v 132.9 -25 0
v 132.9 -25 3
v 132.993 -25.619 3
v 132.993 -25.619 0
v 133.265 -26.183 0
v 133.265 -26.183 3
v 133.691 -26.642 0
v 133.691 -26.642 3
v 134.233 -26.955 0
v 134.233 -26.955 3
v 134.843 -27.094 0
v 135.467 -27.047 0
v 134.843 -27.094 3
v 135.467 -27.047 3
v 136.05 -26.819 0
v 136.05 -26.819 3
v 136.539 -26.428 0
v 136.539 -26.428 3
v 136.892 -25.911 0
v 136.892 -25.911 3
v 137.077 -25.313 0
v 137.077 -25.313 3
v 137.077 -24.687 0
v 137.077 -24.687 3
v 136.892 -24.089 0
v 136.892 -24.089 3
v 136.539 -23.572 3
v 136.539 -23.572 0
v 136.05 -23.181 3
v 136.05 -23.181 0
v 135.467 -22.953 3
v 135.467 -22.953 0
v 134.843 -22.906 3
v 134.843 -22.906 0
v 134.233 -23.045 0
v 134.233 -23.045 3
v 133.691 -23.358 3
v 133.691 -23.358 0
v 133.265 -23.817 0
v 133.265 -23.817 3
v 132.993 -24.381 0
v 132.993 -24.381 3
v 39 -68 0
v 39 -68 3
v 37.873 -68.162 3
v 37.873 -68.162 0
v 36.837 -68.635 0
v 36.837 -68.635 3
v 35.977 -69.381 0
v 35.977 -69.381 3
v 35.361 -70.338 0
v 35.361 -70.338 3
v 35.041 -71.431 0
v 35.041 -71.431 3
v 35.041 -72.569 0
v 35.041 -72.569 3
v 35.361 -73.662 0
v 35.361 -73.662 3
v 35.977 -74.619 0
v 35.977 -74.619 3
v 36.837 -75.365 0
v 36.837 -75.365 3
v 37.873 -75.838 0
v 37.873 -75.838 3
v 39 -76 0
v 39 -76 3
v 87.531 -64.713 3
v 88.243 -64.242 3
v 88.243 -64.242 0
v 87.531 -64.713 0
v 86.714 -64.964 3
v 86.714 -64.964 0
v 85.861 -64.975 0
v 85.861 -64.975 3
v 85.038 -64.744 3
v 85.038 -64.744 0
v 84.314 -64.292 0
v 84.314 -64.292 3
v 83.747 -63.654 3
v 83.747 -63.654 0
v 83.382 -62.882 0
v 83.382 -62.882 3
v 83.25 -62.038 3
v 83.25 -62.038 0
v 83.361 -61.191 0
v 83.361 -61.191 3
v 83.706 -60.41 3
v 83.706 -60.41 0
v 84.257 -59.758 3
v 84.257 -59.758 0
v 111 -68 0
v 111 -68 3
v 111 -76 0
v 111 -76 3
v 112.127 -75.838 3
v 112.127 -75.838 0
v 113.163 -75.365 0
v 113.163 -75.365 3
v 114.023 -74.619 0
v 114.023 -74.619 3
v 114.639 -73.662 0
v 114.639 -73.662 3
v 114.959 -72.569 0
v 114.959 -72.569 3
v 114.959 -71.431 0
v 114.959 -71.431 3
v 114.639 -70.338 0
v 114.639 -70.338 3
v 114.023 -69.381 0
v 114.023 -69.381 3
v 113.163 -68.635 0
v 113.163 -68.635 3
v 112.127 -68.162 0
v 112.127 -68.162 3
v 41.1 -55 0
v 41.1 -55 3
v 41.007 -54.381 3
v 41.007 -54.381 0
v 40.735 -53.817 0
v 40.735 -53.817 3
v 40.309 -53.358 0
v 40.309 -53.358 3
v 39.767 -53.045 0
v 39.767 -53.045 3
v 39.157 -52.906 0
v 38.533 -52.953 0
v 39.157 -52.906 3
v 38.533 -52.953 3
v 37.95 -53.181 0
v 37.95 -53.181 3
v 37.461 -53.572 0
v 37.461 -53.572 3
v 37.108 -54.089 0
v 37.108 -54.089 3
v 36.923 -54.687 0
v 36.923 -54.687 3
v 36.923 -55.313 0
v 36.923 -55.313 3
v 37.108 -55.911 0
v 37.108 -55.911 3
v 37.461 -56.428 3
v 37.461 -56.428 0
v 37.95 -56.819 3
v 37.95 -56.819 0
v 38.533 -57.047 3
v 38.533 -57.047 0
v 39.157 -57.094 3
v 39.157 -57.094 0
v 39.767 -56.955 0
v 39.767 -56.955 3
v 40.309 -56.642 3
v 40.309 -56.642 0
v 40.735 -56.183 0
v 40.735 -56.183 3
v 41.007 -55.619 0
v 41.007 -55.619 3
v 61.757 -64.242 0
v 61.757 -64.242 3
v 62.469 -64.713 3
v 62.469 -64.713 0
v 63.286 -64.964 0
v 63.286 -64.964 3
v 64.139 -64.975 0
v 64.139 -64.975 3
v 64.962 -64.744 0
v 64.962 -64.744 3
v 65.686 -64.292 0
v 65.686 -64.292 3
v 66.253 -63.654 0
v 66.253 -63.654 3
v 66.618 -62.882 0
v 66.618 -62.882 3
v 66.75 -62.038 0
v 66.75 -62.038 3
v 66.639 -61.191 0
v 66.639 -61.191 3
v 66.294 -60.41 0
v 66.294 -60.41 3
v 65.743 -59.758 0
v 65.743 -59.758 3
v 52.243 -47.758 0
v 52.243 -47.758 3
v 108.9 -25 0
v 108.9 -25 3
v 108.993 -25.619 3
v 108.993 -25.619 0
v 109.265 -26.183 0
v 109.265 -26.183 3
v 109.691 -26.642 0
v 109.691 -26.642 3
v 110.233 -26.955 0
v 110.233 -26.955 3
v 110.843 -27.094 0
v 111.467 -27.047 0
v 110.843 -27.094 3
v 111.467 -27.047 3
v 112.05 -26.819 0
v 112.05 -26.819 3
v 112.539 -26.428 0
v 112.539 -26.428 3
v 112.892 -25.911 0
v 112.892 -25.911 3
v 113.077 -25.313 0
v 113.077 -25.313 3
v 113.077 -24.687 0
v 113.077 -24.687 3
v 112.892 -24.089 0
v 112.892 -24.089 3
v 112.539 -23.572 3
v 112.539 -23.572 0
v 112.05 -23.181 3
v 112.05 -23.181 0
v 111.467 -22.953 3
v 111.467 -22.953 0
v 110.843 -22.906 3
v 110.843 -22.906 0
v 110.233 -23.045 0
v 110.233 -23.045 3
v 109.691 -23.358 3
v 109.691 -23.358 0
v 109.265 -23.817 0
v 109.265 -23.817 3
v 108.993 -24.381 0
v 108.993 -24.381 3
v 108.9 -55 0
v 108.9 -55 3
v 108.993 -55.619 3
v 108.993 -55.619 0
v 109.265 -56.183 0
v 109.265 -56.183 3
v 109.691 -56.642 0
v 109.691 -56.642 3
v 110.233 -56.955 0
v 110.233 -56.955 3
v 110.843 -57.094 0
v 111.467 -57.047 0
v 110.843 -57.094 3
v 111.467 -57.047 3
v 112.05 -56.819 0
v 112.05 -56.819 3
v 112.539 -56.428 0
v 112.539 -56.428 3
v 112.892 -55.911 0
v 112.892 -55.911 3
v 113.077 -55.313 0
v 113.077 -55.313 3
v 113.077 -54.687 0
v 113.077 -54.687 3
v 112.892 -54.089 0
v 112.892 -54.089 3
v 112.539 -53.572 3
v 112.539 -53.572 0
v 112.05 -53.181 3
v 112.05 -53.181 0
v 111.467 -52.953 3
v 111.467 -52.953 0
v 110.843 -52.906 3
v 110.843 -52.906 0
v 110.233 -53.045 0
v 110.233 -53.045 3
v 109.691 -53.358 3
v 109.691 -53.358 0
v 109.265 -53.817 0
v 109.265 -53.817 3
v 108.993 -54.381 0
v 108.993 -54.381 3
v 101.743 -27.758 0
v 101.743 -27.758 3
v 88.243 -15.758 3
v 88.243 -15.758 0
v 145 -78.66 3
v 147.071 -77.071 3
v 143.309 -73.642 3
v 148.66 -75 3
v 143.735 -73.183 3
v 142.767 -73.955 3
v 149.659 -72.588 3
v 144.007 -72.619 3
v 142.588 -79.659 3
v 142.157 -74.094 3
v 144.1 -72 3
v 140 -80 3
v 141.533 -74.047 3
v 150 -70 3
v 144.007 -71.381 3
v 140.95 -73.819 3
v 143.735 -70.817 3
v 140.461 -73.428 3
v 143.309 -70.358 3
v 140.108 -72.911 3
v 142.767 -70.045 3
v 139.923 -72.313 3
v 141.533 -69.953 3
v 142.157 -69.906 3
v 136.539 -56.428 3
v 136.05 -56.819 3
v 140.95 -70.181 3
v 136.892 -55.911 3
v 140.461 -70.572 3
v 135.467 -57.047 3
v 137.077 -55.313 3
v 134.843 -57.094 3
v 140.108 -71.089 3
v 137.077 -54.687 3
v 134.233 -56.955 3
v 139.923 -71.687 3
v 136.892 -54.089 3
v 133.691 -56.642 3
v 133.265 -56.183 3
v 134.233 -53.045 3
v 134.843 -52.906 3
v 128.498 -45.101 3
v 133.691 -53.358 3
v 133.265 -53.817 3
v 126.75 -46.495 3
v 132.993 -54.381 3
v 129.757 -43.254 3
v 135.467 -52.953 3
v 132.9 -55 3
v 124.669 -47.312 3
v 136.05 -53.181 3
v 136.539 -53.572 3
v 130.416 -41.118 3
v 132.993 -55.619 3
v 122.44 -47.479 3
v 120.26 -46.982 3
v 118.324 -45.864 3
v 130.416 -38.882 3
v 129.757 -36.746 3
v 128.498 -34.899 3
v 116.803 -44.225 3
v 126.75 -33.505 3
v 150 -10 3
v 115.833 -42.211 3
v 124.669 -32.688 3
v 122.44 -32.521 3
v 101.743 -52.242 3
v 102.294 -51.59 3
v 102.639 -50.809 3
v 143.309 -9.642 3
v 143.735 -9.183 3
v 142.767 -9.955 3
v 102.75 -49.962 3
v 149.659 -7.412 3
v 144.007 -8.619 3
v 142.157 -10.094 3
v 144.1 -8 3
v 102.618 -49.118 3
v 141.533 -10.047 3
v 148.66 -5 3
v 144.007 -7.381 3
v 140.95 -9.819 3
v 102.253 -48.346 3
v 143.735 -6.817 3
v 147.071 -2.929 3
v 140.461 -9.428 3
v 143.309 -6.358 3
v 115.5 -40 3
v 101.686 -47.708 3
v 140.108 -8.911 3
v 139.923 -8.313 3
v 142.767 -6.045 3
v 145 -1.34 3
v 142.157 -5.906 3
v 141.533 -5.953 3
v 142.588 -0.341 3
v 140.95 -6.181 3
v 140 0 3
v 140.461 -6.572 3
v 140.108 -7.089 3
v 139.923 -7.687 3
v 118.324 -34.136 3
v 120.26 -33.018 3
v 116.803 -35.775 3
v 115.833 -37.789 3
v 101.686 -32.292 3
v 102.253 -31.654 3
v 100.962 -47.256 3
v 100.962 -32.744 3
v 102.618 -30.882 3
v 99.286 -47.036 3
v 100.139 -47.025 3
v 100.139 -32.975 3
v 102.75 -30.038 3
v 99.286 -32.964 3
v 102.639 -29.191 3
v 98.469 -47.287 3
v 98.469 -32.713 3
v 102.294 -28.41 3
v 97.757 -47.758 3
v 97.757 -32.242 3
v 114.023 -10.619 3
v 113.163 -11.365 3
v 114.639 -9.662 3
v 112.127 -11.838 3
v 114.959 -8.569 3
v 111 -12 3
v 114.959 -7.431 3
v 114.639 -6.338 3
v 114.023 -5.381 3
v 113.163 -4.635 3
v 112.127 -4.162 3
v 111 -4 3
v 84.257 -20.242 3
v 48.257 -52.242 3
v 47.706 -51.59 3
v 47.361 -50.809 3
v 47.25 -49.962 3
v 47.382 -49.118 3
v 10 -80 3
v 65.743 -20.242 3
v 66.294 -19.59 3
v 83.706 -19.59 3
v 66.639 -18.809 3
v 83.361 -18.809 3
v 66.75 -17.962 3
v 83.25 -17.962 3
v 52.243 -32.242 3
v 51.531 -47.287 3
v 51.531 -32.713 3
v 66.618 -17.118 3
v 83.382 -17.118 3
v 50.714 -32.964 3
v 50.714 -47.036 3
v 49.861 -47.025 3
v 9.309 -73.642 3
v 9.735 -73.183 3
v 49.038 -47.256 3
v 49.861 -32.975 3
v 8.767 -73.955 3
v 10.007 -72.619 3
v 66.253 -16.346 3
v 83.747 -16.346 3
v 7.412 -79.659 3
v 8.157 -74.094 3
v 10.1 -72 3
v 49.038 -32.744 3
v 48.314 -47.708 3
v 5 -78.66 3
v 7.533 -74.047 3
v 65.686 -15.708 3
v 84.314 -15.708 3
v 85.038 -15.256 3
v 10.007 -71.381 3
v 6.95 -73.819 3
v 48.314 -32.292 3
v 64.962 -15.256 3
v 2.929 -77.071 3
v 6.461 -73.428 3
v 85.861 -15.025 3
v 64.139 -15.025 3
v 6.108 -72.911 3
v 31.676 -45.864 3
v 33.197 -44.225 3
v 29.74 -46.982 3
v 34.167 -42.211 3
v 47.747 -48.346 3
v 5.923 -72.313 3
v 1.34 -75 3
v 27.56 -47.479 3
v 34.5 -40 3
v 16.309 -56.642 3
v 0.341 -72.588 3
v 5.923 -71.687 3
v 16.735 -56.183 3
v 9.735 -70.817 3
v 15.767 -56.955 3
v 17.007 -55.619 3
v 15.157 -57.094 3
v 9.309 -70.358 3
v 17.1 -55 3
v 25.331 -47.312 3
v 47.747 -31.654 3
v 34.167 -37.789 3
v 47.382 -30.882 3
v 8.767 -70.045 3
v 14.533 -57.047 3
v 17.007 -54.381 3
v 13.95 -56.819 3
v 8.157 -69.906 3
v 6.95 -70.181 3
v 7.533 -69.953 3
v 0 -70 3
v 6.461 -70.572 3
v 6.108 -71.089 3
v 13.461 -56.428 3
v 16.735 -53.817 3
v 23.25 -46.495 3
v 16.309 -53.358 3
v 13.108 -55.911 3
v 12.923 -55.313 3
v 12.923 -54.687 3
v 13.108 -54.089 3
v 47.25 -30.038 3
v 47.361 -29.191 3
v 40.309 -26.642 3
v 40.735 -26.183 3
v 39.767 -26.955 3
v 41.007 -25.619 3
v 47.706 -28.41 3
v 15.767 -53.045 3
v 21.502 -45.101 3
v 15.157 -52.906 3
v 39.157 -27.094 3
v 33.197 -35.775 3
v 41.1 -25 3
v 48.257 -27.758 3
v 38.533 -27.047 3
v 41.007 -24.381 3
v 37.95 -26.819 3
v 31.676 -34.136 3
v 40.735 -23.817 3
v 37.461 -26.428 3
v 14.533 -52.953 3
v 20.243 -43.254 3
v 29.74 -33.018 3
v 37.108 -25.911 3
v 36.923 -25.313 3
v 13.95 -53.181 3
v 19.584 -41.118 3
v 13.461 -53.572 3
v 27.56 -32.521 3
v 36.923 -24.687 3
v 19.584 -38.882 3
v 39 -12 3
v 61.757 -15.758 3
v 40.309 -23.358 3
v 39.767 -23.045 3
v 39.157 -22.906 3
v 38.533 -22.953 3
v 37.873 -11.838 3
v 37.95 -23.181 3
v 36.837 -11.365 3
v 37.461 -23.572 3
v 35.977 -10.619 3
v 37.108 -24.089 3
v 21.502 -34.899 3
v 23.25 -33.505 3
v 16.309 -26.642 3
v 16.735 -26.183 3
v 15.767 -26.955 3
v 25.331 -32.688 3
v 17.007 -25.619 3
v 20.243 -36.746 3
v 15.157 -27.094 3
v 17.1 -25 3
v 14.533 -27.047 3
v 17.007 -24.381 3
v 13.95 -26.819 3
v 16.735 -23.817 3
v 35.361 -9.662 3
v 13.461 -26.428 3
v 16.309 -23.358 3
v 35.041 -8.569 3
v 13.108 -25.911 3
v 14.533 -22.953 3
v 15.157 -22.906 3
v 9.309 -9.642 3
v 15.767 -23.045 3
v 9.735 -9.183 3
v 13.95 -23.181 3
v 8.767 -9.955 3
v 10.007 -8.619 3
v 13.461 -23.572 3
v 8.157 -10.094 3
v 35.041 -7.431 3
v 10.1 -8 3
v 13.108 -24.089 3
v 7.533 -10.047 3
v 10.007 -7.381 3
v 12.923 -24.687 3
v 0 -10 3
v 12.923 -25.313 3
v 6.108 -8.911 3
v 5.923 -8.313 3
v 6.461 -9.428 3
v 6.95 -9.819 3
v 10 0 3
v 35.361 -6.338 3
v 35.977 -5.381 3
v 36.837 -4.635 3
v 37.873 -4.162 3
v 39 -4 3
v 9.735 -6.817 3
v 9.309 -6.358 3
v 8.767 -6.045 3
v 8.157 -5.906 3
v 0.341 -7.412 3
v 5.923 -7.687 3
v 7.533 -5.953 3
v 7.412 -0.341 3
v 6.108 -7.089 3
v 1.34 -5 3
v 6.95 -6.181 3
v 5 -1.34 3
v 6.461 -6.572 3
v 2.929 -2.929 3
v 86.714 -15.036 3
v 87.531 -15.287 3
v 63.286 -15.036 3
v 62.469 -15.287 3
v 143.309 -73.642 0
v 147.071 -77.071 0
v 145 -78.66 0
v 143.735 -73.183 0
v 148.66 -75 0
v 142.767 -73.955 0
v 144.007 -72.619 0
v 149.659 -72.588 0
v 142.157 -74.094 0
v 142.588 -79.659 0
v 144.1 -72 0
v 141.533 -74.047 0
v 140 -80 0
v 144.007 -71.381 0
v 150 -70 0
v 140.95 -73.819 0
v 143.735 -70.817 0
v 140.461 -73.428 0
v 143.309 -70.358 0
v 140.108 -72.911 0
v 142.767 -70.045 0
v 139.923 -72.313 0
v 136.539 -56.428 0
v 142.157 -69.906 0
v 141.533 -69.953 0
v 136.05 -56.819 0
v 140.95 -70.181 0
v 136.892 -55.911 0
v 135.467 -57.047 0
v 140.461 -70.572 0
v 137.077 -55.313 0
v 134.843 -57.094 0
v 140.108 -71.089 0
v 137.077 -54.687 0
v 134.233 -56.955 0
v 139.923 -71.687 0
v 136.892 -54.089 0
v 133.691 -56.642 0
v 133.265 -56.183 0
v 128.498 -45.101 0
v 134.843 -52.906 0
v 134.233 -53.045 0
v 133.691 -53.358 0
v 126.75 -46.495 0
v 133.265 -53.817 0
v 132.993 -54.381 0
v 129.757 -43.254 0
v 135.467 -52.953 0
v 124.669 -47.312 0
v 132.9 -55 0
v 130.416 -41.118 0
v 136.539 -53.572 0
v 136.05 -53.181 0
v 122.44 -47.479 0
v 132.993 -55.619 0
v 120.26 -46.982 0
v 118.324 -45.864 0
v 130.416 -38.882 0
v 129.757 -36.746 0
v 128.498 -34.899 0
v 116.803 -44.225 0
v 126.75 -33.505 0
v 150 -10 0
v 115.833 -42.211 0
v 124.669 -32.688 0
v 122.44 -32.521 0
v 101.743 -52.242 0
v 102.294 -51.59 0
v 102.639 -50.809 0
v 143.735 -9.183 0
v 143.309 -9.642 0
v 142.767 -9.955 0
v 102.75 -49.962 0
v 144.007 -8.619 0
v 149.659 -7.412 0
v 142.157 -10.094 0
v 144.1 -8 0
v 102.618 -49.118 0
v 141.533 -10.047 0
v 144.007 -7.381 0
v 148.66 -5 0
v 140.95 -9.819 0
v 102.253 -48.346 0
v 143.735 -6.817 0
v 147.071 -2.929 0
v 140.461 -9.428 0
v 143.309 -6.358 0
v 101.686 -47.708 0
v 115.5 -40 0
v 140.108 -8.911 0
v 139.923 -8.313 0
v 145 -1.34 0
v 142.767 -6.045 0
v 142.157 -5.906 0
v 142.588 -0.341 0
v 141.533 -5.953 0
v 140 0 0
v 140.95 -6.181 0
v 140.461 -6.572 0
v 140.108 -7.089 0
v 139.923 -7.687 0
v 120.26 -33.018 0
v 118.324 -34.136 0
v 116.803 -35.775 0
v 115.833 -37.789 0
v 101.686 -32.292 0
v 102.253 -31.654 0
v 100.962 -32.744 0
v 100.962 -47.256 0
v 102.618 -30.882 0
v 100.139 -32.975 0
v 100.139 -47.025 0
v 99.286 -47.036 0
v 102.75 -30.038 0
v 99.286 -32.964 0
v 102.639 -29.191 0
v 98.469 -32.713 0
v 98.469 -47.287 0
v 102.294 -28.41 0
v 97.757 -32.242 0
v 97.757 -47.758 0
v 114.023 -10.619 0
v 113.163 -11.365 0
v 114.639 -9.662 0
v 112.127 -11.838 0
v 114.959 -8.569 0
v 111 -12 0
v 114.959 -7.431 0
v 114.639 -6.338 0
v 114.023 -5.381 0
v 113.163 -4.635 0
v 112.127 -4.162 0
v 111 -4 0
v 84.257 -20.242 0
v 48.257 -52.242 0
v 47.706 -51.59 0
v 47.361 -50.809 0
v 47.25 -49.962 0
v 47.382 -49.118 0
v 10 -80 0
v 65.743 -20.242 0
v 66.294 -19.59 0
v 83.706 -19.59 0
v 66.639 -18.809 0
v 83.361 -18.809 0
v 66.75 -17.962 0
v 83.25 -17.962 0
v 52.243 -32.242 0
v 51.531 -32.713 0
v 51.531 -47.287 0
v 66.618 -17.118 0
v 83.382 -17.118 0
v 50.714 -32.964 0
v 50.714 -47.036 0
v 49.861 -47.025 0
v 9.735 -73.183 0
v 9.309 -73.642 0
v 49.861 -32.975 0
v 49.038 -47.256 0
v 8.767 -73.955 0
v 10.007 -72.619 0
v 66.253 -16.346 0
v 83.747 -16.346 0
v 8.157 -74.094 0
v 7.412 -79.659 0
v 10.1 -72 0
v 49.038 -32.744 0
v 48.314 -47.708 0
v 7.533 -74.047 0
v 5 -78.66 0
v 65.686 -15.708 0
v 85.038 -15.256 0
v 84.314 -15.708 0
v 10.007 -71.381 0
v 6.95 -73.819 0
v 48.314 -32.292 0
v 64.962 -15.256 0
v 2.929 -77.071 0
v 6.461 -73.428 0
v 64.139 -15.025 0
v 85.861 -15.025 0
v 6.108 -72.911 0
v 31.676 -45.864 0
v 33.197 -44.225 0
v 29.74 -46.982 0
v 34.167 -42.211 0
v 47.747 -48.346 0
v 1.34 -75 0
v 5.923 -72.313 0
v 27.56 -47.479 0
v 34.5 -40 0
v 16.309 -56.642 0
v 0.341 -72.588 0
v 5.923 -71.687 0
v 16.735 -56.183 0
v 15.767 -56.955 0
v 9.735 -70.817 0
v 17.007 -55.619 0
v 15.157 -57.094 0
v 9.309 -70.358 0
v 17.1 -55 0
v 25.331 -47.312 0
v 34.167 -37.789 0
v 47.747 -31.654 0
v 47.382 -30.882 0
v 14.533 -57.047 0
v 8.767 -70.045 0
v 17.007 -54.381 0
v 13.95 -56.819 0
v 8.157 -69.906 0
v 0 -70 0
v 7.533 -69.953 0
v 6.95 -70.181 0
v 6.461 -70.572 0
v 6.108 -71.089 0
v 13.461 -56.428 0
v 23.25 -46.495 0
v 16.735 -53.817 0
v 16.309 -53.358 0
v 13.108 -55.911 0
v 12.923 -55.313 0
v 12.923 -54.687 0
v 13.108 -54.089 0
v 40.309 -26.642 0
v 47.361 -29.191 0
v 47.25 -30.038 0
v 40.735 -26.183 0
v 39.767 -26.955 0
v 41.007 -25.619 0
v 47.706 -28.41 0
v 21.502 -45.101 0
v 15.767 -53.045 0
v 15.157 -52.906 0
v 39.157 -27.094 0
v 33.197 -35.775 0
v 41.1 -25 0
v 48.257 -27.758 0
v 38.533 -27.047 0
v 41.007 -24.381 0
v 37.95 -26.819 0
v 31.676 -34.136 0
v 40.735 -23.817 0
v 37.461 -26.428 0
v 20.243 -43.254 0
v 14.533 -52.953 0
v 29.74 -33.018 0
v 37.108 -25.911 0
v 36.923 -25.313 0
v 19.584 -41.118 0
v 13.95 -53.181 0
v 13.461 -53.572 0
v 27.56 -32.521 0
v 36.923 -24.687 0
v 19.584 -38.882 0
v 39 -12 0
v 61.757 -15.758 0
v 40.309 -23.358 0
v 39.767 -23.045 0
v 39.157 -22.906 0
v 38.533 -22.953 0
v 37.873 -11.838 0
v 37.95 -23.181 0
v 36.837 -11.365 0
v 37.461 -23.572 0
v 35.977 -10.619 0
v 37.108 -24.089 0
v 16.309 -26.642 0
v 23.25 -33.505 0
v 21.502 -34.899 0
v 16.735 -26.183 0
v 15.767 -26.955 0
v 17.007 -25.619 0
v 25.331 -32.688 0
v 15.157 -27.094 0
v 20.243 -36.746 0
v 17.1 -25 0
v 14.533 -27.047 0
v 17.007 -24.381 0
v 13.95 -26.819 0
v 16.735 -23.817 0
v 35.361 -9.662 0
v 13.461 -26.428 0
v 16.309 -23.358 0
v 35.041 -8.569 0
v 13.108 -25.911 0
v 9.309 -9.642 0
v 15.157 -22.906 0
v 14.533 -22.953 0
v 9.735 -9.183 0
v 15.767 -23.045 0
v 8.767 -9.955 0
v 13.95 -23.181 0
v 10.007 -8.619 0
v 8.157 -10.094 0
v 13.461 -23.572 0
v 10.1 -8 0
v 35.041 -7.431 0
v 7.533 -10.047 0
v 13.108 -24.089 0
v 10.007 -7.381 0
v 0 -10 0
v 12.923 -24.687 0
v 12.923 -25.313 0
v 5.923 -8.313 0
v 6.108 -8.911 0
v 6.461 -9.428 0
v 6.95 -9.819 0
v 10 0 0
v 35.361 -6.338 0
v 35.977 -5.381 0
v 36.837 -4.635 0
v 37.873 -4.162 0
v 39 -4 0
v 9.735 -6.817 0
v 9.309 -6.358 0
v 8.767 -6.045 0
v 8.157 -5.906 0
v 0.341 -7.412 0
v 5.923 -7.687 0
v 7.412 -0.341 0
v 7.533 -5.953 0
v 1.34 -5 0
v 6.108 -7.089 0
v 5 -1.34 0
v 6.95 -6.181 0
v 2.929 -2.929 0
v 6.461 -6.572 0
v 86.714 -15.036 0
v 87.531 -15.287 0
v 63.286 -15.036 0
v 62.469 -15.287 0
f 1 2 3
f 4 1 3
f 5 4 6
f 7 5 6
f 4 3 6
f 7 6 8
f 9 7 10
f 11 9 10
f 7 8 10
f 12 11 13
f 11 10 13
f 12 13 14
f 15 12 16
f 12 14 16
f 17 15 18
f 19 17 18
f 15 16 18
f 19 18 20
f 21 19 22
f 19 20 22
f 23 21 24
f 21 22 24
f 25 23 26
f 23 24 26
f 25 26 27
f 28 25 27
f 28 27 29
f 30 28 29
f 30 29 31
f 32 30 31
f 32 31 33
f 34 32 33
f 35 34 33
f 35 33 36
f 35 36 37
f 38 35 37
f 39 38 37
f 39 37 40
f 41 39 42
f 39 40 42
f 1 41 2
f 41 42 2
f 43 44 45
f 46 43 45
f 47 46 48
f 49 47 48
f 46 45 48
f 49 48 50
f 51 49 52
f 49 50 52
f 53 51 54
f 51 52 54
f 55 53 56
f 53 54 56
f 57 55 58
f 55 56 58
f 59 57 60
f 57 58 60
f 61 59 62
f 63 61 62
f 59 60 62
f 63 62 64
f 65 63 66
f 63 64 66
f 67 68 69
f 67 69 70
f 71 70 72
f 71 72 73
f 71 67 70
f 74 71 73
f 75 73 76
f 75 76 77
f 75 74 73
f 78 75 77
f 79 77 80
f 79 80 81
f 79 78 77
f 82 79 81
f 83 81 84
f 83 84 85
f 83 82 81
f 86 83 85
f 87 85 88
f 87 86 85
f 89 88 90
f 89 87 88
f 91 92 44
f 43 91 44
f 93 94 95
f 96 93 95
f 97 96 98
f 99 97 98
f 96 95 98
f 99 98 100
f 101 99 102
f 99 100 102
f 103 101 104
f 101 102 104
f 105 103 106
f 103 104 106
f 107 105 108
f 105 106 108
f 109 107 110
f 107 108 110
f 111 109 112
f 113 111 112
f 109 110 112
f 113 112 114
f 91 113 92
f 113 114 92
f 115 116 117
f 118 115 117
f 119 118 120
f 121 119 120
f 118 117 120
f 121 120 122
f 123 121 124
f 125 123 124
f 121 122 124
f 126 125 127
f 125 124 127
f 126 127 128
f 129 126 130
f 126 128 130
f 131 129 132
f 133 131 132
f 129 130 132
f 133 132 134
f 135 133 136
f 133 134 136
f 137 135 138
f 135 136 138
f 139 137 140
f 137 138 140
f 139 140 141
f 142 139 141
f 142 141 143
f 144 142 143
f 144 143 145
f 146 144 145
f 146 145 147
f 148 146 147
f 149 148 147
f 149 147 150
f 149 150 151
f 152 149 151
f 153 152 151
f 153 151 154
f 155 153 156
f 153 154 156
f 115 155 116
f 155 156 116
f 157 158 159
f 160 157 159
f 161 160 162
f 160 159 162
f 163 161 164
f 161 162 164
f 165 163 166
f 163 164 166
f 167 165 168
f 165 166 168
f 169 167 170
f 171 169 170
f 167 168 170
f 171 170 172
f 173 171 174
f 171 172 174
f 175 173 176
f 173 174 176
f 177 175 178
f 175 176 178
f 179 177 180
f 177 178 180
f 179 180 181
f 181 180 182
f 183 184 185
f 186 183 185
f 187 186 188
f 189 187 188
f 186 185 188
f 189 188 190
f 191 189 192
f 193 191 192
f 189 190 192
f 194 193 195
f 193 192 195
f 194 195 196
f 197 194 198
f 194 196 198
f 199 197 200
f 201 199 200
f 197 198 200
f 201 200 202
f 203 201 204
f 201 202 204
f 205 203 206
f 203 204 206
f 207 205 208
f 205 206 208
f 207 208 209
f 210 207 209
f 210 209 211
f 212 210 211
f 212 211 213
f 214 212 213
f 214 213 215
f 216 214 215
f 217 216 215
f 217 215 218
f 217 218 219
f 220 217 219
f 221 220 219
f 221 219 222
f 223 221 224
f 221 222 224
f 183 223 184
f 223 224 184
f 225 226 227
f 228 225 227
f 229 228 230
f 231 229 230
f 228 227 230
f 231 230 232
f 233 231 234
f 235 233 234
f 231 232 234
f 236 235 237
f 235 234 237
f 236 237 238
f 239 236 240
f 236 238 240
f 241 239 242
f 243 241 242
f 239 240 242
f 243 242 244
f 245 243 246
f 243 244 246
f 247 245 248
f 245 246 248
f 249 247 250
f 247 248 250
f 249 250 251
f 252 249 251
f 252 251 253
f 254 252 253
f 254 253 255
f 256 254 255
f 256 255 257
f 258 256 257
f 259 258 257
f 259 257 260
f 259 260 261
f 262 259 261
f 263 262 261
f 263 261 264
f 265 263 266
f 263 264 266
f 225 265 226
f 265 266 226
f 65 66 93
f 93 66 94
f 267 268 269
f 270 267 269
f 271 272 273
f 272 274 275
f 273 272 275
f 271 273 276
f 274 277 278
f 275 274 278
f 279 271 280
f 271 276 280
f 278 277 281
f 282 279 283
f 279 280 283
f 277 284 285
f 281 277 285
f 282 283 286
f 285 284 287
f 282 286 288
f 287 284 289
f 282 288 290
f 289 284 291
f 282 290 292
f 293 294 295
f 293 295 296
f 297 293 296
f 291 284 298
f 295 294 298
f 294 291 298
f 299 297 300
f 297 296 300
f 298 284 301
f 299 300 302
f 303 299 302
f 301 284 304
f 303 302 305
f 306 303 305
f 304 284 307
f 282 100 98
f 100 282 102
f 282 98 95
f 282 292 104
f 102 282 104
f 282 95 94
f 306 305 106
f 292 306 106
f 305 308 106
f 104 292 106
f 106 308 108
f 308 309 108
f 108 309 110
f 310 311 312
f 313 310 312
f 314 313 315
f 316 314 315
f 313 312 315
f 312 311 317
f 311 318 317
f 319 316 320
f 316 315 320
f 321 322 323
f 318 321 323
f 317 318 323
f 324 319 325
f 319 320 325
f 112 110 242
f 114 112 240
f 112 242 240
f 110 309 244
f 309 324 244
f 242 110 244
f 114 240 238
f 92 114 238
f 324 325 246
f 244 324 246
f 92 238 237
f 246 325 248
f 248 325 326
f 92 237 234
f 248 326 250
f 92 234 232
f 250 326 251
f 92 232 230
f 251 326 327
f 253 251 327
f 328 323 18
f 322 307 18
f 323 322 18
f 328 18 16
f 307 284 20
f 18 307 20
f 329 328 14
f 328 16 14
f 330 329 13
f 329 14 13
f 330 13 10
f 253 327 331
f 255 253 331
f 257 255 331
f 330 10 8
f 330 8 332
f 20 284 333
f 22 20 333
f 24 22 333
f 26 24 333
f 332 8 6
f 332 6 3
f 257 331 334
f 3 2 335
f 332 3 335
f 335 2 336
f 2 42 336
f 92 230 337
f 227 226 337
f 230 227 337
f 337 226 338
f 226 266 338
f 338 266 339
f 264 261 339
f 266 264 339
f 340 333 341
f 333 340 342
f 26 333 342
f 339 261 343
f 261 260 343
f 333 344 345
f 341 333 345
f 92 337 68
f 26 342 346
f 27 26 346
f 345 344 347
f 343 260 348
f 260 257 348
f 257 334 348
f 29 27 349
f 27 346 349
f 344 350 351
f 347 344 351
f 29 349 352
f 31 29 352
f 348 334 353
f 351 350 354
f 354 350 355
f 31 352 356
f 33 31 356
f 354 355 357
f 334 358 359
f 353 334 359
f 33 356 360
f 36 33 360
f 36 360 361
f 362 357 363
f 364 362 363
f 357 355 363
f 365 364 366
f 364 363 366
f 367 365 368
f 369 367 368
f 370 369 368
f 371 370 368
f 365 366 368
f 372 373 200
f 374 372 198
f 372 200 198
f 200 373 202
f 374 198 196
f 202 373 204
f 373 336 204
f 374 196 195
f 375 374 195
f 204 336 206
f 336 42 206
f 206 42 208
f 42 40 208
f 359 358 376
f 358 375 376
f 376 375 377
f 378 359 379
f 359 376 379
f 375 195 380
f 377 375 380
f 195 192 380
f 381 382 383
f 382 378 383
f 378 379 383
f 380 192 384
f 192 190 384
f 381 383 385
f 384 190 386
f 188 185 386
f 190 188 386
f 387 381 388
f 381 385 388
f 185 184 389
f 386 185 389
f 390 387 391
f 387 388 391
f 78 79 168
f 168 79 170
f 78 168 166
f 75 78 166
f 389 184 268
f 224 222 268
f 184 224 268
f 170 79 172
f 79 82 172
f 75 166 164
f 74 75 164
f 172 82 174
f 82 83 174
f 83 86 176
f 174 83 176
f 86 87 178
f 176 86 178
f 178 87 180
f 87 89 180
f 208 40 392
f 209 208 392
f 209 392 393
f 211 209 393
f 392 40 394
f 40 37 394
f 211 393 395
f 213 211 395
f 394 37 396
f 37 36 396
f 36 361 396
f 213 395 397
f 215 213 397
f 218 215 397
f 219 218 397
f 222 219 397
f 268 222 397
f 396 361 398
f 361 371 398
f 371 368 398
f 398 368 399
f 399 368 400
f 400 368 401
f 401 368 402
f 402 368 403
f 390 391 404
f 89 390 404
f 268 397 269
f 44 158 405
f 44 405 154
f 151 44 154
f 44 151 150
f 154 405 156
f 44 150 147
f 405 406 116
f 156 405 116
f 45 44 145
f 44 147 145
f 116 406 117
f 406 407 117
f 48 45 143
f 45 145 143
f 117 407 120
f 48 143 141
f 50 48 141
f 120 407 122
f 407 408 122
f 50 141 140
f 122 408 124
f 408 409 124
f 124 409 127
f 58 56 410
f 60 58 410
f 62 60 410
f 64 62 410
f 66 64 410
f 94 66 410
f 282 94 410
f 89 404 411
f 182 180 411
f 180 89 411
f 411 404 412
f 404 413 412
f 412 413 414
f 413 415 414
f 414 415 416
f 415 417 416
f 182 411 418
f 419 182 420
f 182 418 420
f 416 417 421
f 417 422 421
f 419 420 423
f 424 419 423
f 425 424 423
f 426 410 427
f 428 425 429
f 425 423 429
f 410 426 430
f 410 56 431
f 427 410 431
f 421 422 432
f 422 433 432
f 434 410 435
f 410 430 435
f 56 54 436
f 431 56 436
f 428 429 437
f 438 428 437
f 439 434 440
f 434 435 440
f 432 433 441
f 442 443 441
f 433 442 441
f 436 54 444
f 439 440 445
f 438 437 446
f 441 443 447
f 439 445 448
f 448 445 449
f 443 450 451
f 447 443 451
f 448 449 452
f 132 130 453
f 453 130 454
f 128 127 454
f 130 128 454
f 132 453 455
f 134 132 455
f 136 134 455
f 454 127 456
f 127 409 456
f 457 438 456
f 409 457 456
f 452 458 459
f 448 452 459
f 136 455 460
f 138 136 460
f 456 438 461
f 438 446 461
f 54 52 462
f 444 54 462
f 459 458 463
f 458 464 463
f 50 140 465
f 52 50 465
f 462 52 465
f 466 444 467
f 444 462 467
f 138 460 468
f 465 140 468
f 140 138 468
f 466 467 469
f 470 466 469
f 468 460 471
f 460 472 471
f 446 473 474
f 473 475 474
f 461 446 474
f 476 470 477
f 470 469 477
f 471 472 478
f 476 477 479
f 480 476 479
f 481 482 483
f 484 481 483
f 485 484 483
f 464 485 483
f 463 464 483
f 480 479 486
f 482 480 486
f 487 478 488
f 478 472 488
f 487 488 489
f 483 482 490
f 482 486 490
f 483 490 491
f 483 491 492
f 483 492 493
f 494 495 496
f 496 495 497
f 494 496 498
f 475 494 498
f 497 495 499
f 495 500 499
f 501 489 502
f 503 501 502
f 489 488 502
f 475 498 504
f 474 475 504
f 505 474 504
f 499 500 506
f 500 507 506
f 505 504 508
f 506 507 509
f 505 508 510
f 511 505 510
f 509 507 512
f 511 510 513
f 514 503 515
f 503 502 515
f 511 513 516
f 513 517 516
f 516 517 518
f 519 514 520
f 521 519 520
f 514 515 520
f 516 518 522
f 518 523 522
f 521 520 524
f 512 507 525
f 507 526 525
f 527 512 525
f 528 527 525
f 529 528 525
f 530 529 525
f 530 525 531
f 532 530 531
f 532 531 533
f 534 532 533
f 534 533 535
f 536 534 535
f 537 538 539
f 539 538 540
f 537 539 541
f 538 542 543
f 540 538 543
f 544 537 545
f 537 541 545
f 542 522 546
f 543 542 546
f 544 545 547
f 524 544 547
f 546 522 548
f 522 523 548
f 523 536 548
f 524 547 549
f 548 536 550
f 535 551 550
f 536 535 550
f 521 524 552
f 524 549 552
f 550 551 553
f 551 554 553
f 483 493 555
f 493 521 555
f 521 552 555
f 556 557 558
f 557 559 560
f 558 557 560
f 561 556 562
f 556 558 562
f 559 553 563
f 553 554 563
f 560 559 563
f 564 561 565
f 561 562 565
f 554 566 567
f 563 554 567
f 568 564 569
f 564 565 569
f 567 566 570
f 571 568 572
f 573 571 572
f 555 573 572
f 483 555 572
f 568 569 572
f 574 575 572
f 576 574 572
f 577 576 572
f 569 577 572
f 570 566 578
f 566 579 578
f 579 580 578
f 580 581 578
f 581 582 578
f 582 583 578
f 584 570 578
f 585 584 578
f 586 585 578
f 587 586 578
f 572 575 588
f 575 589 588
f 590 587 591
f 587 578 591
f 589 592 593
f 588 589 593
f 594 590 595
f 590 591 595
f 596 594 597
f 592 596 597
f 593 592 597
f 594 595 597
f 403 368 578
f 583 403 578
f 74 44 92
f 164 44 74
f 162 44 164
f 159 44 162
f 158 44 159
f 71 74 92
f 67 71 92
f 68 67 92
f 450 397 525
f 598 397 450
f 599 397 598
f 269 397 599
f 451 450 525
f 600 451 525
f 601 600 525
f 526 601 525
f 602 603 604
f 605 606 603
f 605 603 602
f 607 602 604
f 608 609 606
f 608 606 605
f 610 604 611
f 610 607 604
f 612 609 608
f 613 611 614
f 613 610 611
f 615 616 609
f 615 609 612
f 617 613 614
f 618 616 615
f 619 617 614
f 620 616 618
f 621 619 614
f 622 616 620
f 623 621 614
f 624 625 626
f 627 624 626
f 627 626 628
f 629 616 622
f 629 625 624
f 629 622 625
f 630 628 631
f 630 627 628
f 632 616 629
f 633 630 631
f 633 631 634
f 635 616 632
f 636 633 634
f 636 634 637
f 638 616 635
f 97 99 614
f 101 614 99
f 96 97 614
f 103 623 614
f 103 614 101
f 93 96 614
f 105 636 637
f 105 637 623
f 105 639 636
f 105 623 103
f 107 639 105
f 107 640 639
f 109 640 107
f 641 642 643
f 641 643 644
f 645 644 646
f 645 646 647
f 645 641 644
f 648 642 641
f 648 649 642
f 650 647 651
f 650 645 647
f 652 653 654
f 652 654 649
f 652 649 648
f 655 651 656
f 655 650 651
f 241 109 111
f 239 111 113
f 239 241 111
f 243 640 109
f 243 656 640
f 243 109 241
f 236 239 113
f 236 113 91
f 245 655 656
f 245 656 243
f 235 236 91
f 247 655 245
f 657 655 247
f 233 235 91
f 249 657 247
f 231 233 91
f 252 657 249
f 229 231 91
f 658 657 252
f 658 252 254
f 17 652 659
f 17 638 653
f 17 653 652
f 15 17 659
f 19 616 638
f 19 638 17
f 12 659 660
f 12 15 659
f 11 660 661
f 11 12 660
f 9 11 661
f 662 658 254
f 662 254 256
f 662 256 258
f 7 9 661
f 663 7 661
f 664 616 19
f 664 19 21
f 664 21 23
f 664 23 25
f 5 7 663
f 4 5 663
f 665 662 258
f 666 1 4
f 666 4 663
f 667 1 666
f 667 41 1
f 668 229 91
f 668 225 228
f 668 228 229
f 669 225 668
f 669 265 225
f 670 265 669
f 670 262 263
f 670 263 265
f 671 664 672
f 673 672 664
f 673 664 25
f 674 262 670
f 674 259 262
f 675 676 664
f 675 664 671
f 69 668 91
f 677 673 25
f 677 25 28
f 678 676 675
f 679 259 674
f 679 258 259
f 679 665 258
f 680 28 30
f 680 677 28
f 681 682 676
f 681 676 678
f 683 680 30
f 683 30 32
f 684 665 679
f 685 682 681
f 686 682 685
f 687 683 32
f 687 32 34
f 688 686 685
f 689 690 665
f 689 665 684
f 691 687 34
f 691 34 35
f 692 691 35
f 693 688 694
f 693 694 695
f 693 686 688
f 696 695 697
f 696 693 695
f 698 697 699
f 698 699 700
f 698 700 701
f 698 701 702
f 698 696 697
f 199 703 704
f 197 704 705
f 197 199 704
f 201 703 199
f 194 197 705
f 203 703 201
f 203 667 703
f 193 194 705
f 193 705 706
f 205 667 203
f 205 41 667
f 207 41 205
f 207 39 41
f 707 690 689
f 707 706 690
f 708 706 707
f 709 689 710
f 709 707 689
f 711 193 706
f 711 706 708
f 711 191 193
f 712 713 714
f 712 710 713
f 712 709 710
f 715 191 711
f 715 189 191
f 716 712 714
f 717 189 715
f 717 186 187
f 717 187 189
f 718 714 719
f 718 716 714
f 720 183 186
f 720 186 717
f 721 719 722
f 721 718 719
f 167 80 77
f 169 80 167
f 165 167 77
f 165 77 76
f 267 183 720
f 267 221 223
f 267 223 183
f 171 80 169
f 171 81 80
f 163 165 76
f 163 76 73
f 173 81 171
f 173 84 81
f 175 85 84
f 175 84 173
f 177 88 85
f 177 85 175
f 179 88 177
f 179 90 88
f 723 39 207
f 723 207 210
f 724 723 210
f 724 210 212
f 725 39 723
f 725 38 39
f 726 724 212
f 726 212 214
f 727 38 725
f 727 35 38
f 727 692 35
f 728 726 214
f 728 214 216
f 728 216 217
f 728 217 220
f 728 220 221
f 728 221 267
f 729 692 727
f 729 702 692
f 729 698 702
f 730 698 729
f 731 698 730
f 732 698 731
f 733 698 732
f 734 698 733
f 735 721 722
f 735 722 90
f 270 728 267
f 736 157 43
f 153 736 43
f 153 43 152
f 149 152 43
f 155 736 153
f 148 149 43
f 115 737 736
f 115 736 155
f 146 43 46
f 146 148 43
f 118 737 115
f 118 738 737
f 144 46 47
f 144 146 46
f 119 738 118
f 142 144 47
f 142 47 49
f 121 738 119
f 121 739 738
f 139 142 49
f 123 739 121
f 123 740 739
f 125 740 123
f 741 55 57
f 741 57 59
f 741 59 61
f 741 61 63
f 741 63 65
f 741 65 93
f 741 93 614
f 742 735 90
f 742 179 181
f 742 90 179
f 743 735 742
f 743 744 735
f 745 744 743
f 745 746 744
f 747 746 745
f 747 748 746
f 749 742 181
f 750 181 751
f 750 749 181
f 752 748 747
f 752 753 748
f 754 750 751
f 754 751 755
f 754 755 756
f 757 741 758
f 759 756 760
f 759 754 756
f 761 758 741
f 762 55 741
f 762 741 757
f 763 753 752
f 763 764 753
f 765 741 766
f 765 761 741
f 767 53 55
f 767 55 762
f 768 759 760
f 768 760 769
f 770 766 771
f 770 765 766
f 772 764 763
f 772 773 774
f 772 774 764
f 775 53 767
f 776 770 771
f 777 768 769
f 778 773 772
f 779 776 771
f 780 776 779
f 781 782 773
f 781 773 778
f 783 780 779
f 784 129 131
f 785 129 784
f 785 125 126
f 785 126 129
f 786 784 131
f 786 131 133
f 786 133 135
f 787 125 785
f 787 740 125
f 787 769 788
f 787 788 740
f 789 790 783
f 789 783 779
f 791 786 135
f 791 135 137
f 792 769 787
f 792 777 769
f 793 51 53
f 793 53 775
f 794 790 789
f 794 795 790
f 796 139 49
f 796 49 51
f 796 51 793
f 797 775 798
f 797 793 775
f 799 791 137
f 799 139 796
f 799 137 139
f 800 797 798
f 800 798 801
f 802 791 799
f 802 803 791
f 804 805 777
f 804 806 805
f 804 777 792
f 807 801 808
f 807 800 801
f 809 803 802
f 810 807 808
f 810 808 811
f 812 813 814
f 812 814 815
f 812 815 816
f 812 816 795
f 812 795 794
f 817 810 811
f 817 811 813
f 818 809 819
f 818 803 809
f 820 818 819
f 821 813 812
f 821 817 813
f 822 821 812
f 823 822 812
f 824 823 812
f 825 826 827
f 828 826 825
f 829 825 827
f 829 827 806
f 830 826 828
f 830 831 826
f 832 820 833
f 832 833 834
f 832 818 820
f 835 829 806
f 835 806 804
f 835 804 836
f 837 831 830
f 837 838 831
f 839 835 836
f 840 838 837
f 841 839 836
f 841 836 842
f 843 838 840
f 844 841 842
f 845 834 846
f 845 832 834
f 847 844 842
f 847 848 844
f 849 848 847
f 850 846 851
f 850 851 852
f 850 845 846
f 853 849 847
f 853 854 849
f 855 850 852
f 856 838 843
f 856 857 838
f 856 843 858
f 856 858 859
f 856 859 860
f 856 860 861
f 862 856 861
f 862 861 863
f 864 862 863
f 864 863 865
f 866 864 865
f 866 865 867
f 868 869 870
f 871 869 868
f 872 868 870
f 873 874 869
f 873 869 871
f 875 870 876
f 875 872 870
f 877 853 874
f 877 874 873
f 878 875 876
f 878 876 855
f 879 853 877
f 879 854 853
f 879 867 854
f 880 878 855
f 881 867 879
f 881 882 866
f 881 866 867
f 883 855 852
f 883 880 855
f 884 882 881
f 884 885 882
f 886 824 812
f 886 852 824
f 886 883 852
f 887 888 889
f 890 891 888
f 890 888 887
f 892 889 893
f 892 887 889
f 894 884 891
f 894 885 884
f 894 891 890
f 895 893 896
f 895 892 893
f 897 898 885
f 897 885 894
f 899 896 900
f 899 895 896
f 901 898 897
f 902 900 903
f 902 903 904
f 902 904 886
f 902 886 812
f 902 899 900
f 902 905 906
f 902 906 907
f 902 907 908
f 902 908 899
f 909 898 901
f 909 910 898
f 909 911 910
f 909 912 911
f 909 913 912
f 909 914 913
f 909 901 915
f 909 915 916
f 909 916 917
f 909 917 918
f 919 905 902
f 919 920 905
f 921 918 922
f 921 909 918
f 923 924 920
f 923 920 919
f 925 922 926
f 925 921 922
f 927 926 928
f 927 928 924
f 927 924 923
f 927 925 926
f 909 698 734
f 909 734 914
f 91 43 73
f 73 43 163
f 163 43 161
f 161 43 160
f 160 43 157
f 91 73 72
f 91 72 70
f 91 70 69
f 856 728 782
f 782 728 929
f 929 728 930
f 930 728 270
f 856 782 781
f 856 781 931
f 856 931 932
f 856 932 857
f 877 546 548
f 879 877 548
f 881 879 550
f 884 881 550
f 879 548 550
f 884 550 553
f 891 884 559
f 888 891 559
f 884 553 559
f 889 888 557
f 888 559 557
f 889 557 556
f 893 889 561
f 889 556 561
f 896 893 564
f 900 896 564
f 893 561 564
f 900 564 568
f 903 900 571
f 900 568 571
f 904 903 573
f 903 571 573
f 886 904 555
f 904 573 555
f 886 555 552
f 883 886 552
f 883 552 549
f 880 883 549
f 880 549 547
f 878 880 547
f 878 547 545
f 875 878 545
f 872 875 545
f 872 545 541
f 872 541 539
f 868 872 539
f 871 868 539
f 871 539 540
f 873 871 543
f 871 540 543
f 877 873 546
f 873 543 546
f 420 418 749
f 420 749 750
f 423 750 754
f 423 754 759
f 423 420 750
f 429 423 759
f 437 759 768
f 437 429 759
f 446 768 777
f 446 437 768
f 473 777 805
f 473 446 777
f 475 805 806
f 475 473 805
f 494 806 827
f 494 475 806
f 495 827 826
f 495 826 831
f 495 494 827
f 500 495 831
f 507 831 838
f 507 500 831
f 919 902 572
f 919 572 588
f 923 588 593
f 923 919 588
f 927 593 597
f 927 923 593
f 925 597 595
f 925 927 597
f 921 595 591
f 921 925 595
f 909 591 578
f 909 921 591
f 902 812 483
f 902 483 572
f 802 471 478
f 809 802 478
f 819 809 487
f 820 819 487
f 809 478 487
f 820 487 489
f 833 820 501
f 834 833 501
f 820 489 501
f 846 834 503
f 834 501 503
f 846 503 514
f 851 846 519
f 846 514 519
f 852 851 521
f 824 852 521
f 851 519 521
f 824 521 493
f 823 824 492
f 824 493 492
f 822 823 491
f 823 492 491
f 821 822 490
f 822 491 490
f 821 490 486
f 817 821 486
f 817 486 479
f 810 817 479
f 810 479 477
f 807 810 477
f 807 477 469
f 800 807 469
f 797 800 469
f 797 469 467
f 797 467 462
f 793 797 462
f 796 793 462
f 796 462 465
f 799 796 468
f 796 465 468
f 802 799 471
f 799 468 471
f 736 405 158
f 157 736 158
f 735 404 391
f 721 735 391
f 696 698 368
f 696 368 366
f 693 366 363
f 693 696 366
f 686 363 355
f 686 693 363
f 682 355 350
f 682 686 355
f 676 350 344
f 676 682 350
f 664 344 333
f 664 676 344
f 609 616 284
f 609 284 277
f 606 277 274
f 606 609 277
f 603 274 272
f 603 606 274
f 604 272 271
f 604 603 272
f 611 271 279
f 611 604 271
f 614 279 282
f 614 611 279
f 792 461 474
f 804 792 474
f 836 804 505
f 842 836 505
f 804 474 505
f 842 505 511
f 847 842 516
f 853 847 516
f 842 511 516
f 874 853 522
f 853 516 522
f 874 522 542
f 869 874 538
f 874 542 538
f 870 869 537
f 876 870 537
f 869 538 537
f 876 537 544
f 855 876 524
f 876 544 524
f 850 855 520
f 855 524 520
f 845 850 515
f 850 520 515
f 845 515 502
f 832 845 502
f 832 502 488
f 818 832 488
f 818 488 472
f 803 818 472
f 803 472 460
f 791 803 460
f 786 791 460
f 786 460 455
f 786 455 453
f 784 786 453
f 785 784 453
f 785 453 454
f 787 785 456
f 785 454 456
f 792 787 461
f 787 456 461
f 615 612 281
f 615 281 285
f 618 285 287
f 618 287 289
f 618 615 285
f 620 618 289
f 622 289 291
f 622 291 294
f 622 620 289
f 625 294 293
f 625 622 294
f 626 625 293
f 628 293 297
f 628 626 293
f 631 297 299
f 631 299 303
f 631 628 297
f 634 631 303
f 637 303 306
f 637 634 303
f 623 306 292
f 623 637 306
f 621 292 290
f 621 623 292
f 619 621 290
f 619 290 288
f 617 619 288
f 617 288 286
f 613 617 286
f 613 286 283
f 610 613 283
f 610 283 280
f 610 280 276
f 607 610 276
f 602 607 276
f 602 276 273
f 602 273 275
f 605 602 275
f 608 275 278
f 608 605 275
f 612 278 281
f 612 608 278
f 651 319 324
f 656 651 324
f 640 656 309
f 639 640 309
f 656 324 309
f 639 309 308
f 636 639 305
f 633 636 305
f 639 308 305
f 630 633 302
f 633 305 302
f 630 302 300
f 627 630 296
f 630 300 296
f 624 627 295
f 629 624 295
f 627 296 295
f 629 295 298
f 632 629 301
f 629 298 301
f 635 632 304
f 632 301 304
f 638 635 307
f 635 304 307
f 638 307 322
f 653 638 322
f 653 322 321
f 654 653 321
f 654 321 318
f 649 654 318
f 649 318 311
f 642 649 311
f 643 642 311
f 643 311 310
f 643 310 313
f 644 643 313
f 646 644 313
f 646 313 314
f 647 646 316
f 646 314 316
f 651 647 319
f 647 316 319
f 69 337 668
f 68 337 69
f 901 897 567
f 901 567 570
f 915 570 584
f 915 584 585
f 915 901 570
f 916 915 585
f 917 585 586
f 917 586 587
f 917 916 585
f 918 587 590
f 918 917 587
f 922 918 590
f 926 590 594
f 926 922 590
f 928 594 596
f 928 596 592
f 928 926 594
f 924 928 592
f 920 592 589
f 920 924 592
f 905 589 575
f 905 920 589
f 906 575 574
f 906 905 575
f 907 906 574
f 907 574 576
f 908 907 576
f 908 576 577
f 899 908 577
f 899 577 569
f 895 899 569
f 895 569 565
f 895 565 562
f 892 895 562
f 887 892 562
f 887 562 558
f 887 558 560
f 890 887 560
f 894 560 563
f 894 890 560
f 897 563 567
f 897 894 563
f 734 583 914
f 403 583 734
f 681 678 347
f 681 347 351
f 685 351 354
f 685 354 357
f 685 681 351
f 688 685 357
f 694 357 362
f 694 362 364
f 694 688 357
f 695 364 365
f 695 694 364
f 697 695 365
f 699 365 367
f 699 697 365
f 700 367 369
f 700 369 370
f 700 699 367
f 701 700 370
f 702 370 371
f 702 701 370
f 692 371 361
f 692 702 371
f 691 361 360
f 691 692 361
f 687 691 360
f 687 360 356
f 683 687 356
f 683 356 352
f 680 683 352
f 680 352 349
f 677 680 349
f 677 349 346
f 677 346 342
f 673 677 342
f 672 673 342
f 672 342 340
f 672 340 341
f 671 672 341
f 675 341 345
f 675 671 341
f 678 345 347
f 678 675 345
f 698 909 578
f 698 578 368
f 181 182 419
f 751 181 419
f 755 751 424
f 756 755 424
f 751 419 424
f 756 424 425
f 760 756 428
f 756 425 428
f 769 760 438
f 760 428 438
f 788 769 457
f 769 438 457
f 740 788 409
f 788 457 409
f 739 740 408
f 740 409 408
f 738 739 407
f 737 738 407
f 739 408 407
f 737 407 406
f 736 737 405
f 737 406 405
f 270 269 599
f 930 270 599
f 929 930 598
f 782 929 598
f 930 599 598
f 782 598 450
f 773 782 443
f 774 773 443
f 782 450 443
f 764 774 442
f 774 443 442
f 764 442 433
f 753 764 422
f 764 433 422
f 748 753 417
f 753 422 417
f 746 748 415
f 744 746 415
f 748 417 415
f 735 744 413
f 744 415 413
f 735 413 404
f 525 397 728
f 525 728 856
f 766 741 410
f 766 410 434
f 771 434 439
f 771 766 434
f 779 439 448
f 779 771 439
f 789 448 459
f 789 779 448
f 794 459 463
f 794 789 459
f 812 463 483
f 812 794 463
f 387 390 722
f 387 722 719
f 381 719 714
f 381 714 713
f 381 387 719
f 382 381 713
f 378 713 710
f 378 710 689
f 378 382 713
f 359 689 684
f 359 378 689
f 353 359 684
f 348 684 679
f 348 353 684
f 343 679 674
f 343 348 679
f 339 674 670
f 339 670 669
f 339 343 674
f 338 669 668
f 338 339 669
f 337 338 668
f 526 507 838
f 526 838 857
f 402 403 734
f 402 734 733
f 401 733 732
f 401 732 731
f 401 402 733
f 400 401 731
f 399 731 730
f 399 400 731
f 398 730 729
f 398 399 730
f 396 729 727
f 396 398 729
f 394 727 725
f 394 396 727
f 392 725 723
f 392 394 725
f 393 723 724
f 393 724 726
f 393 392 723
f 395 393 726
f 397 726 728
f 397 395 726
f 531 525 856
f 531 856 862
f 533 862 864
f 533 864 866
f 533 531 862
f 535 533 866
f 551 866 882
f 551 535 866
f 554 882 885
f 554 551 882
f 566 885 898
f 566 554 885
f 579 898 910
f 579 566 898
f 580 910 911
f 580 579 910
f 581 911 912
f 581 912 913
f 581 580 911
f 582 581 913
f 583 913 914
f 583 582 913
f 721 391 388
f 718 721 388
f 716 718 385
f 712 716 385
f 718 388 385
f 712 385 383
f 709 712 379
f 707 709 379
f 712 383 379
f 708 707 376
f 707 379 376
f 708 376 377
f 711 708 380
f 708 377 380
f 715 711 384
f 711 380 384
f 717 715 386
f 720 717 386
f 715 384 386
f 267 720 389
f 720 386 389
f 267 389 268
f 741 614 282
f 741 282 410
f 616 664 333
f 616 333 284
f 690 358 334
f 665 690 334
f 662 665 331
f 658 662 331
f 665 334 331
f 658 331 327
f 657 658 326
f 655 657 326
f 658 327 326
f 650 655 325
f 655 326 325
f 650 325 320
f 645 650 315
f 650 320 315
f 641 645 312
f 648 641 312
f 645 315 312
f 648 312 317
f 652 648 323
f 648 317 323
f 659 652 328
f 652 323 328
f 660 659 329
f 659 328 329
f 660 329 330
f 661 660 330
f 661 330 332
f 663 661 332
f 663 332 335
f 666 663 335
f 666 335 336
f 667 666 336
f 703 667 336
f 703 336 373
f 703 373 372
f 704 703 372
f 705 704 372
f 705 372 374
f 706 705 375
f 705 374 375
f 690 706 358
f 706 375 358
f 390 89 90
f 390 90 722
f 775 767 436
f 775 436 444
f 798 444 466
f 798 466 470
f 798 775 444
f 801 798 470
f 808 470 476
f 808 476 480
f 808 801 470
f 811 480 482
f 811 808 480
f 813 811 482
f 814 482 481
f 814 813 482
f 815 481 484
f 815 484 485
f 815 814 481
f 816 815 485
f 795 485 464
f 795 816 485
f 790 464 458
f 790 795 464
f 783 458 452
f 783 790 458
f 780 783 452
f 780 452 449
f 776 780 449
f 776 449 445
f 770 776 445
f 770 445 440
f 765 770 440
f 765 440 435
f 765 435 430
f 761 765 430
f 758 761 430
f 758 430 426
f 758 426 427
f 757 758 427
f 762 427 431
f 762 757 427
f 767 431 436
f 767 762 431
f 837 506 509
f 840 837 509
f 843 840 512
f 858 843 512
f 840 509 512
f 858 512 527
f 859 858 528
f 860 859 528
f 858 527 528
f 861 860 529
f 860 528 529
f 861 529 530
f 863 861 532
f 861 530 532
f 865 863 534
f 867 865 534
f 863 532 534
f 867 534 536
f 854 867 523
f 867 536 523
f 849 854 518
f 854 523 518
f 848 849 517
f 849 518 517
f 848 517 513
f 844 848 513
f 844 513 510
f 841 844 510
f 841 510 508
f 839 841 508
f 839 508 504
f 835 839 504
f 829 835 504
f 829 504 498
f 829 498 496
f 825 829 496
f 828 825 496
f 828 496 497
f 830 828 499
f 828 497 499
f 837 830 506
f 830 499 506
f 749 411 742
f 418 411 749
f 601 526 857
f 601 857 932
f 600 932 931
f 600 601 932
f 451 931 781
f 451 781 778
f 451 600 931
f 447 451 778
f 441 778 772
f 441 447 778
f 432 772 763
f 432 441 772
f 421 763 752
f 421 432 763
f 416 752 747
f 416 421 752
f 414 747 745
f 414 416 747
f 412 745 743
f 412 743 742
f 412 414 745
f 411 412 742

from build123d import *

# Parameters (mm, degrees)
SKETCH_1_R          = 2.1
EXTRUDE_1_DEPTH     = 3
SKETCH_2_R          = 2.1
CUT_EXTRUDE_1_DEPTH = 3
SKETCH_3_R          = 7.5
CUT_EXTRUDE_2_DEPTH = 3


with BuildPart() as part:
    # 草图1 → 凸台-拉伸1 (new body)
    with BuildSketch(Plane.XY):
        with BuildLine():
            Line((10, 0), (140, 0))
            ThreePointArc((140, 0), (147.071067812, -2.928932188), (150, -10))
            Line((150, -10), (150, -70))
            ThreePointArc((150, -70), (147.071067812, -77.071067812), (140, -80))
            Line((140, -80), (10, -80))
            ThreePointArc((10, -80), (2.928932188, -77.071067812), (0, -70))
            Line((0, -70), (0, -10))
            ThreePointArc((0, -10), (2.928932188, -2.928932188), (10, 0))
        make_face()
        with Locations((8, -8)):
            Circle(SKETCH_1_R, mode=Mode.SUBTRACT)
        with Locations((8, -72)):
            Circle(SKETCH_1_R, mode=Mode.SUBTRACT)
        with Locations((142, -72)):
            Circle(SKETCH_1_R, mode=Mode.SUBTRACT)
        with Locations((142, -8)):
            Circle(SKETCH_1_R, mode=Mode.SUBTRACT)
    extrude(amount=EXTRUDE_1_DEPTH)

    # 草图2 → 切除-拉伸1 (cut)
    with BuildSketch(Plane.XY.offset(3)):
        with Locations((15, -25)):
            Circle(SKETCH_2_R)
        with Locations((39, -25)):
            Circle(SKETCH_2_R)
        with Locations((39, -55)):
            Circle(SKETCH_2_R)
        with Locations((15, -55)):
            Circle(SKETCH_2_R)
        with Locations(Location((111, -55, 0), (0, 0, 180))):
            Circle(SKETCH_2_R)
        with Locations(Location((111, -25, 0), (0, 0, 180))):
            Circle(SKETCH_2_R)
        with Locations(Location((135, -25, 0), (0, 0, 180))):
            Circle(SKETCH_2_R)
        with Locations(Location((135, -55, 0), (0, 0, 180))):
            Circle(SKETCH_2_R)
    extrude(amount=-CUT_EXTRUDE_1_DEPTH, mode=Mode.SUBTRACT)

    # 草图3 → 切除-拉伸2 (cut)
    with BuildSketch(Plane.XY.offset(3)):
        with Locations((27, -40)):
            Circle(SKETCH_3_R)
        with Locations(Location((123, -40, 0), (0, 0, 180))):
            Circle(SKETCH_3_R)
        with BuildLine():
            Line((39, -4), (111, -4))
            ThreePointArc((111, -4), (115, -8), (111, -12))
            Line((111, -12), (39, -12))
            ThreePointArc((39, -12), (35, -8), (39, -4))
        make_face()
        with BuildLine():
            Line((39, -76), (111, -76))
            ThreePointArc((111, -76), (115, -72), (111, -68))
            Line((111, -68), (39, -68))
            ThreePointArc((39, -68), (35, -72), (39, -76))
        make_face()
        with BuildLine():
            Line((65.743091516, -20.242227956), (52.243091516, -32.242227956))
            ThreePointArc((52.243091516, -32.242227956), (48.007772044, -31.993091516), (48.256908484, -27.757772044))
            Line((48.256908484, -27.757772044), (61.756908484, -15.757772044))
            ThreePointArc((61.756908484, -15.757772044), (65.992227956, -16.006908484), (65.743091516, -20.242227956))
        make_face()
        with BuildLine():
            Line((65.743091516, -59.757772044), (52.243091516, -47.757772044))
            ThreePointArc((52.243091516, -47.757772044), (48.007772044, -48.006908484), (48.256908484, -52.242227956))
            Line((48.256908484, -52.242227956), (61.756908484, -64.242227956))
            ThreePointArc((61.756908484, -64.242227956), (65.992227956, -63.993091516), (65.743091516, -59.757772044))
        make_face()
        with BuildLine():
            Line((84.256908484, -20.242227956), (97.756908484, -32.242227956))
            ThreePointArc((97.756908484, -32.242227956), (101.992227956, -31.993091516), (101.743091516, -27.757772044))
            Line((101.743091516, -27.757772044), (88.243091516, -15.757772044))
            ThreePointArc((88.243091516, -15.757772044), (84.007772044, -16.006908484), (84.256908484, -20.242227956))
        make_face()
        with BuildLine():
            Line((84.256908484, -59.757772044), (97.756908484, -47.757772044))
            ThreePointArc((97.756908484, -47.757772044), (101.992227956, -48.006908484), (101.743091516, -52.242227956))
            Line((101.743091516, -52.242227956), (88.243091516, -64.242227956))
            ThreePointArc((88.243091516, -64.242227956), (84.007772044, -63.993091516), (84.256908484, -59.757772044))
        make_face()
    extrude(amount=-CUT_EXTRUDE_2_DEPTH, mode=Mode.SUBTRACT)


solid = part.part
